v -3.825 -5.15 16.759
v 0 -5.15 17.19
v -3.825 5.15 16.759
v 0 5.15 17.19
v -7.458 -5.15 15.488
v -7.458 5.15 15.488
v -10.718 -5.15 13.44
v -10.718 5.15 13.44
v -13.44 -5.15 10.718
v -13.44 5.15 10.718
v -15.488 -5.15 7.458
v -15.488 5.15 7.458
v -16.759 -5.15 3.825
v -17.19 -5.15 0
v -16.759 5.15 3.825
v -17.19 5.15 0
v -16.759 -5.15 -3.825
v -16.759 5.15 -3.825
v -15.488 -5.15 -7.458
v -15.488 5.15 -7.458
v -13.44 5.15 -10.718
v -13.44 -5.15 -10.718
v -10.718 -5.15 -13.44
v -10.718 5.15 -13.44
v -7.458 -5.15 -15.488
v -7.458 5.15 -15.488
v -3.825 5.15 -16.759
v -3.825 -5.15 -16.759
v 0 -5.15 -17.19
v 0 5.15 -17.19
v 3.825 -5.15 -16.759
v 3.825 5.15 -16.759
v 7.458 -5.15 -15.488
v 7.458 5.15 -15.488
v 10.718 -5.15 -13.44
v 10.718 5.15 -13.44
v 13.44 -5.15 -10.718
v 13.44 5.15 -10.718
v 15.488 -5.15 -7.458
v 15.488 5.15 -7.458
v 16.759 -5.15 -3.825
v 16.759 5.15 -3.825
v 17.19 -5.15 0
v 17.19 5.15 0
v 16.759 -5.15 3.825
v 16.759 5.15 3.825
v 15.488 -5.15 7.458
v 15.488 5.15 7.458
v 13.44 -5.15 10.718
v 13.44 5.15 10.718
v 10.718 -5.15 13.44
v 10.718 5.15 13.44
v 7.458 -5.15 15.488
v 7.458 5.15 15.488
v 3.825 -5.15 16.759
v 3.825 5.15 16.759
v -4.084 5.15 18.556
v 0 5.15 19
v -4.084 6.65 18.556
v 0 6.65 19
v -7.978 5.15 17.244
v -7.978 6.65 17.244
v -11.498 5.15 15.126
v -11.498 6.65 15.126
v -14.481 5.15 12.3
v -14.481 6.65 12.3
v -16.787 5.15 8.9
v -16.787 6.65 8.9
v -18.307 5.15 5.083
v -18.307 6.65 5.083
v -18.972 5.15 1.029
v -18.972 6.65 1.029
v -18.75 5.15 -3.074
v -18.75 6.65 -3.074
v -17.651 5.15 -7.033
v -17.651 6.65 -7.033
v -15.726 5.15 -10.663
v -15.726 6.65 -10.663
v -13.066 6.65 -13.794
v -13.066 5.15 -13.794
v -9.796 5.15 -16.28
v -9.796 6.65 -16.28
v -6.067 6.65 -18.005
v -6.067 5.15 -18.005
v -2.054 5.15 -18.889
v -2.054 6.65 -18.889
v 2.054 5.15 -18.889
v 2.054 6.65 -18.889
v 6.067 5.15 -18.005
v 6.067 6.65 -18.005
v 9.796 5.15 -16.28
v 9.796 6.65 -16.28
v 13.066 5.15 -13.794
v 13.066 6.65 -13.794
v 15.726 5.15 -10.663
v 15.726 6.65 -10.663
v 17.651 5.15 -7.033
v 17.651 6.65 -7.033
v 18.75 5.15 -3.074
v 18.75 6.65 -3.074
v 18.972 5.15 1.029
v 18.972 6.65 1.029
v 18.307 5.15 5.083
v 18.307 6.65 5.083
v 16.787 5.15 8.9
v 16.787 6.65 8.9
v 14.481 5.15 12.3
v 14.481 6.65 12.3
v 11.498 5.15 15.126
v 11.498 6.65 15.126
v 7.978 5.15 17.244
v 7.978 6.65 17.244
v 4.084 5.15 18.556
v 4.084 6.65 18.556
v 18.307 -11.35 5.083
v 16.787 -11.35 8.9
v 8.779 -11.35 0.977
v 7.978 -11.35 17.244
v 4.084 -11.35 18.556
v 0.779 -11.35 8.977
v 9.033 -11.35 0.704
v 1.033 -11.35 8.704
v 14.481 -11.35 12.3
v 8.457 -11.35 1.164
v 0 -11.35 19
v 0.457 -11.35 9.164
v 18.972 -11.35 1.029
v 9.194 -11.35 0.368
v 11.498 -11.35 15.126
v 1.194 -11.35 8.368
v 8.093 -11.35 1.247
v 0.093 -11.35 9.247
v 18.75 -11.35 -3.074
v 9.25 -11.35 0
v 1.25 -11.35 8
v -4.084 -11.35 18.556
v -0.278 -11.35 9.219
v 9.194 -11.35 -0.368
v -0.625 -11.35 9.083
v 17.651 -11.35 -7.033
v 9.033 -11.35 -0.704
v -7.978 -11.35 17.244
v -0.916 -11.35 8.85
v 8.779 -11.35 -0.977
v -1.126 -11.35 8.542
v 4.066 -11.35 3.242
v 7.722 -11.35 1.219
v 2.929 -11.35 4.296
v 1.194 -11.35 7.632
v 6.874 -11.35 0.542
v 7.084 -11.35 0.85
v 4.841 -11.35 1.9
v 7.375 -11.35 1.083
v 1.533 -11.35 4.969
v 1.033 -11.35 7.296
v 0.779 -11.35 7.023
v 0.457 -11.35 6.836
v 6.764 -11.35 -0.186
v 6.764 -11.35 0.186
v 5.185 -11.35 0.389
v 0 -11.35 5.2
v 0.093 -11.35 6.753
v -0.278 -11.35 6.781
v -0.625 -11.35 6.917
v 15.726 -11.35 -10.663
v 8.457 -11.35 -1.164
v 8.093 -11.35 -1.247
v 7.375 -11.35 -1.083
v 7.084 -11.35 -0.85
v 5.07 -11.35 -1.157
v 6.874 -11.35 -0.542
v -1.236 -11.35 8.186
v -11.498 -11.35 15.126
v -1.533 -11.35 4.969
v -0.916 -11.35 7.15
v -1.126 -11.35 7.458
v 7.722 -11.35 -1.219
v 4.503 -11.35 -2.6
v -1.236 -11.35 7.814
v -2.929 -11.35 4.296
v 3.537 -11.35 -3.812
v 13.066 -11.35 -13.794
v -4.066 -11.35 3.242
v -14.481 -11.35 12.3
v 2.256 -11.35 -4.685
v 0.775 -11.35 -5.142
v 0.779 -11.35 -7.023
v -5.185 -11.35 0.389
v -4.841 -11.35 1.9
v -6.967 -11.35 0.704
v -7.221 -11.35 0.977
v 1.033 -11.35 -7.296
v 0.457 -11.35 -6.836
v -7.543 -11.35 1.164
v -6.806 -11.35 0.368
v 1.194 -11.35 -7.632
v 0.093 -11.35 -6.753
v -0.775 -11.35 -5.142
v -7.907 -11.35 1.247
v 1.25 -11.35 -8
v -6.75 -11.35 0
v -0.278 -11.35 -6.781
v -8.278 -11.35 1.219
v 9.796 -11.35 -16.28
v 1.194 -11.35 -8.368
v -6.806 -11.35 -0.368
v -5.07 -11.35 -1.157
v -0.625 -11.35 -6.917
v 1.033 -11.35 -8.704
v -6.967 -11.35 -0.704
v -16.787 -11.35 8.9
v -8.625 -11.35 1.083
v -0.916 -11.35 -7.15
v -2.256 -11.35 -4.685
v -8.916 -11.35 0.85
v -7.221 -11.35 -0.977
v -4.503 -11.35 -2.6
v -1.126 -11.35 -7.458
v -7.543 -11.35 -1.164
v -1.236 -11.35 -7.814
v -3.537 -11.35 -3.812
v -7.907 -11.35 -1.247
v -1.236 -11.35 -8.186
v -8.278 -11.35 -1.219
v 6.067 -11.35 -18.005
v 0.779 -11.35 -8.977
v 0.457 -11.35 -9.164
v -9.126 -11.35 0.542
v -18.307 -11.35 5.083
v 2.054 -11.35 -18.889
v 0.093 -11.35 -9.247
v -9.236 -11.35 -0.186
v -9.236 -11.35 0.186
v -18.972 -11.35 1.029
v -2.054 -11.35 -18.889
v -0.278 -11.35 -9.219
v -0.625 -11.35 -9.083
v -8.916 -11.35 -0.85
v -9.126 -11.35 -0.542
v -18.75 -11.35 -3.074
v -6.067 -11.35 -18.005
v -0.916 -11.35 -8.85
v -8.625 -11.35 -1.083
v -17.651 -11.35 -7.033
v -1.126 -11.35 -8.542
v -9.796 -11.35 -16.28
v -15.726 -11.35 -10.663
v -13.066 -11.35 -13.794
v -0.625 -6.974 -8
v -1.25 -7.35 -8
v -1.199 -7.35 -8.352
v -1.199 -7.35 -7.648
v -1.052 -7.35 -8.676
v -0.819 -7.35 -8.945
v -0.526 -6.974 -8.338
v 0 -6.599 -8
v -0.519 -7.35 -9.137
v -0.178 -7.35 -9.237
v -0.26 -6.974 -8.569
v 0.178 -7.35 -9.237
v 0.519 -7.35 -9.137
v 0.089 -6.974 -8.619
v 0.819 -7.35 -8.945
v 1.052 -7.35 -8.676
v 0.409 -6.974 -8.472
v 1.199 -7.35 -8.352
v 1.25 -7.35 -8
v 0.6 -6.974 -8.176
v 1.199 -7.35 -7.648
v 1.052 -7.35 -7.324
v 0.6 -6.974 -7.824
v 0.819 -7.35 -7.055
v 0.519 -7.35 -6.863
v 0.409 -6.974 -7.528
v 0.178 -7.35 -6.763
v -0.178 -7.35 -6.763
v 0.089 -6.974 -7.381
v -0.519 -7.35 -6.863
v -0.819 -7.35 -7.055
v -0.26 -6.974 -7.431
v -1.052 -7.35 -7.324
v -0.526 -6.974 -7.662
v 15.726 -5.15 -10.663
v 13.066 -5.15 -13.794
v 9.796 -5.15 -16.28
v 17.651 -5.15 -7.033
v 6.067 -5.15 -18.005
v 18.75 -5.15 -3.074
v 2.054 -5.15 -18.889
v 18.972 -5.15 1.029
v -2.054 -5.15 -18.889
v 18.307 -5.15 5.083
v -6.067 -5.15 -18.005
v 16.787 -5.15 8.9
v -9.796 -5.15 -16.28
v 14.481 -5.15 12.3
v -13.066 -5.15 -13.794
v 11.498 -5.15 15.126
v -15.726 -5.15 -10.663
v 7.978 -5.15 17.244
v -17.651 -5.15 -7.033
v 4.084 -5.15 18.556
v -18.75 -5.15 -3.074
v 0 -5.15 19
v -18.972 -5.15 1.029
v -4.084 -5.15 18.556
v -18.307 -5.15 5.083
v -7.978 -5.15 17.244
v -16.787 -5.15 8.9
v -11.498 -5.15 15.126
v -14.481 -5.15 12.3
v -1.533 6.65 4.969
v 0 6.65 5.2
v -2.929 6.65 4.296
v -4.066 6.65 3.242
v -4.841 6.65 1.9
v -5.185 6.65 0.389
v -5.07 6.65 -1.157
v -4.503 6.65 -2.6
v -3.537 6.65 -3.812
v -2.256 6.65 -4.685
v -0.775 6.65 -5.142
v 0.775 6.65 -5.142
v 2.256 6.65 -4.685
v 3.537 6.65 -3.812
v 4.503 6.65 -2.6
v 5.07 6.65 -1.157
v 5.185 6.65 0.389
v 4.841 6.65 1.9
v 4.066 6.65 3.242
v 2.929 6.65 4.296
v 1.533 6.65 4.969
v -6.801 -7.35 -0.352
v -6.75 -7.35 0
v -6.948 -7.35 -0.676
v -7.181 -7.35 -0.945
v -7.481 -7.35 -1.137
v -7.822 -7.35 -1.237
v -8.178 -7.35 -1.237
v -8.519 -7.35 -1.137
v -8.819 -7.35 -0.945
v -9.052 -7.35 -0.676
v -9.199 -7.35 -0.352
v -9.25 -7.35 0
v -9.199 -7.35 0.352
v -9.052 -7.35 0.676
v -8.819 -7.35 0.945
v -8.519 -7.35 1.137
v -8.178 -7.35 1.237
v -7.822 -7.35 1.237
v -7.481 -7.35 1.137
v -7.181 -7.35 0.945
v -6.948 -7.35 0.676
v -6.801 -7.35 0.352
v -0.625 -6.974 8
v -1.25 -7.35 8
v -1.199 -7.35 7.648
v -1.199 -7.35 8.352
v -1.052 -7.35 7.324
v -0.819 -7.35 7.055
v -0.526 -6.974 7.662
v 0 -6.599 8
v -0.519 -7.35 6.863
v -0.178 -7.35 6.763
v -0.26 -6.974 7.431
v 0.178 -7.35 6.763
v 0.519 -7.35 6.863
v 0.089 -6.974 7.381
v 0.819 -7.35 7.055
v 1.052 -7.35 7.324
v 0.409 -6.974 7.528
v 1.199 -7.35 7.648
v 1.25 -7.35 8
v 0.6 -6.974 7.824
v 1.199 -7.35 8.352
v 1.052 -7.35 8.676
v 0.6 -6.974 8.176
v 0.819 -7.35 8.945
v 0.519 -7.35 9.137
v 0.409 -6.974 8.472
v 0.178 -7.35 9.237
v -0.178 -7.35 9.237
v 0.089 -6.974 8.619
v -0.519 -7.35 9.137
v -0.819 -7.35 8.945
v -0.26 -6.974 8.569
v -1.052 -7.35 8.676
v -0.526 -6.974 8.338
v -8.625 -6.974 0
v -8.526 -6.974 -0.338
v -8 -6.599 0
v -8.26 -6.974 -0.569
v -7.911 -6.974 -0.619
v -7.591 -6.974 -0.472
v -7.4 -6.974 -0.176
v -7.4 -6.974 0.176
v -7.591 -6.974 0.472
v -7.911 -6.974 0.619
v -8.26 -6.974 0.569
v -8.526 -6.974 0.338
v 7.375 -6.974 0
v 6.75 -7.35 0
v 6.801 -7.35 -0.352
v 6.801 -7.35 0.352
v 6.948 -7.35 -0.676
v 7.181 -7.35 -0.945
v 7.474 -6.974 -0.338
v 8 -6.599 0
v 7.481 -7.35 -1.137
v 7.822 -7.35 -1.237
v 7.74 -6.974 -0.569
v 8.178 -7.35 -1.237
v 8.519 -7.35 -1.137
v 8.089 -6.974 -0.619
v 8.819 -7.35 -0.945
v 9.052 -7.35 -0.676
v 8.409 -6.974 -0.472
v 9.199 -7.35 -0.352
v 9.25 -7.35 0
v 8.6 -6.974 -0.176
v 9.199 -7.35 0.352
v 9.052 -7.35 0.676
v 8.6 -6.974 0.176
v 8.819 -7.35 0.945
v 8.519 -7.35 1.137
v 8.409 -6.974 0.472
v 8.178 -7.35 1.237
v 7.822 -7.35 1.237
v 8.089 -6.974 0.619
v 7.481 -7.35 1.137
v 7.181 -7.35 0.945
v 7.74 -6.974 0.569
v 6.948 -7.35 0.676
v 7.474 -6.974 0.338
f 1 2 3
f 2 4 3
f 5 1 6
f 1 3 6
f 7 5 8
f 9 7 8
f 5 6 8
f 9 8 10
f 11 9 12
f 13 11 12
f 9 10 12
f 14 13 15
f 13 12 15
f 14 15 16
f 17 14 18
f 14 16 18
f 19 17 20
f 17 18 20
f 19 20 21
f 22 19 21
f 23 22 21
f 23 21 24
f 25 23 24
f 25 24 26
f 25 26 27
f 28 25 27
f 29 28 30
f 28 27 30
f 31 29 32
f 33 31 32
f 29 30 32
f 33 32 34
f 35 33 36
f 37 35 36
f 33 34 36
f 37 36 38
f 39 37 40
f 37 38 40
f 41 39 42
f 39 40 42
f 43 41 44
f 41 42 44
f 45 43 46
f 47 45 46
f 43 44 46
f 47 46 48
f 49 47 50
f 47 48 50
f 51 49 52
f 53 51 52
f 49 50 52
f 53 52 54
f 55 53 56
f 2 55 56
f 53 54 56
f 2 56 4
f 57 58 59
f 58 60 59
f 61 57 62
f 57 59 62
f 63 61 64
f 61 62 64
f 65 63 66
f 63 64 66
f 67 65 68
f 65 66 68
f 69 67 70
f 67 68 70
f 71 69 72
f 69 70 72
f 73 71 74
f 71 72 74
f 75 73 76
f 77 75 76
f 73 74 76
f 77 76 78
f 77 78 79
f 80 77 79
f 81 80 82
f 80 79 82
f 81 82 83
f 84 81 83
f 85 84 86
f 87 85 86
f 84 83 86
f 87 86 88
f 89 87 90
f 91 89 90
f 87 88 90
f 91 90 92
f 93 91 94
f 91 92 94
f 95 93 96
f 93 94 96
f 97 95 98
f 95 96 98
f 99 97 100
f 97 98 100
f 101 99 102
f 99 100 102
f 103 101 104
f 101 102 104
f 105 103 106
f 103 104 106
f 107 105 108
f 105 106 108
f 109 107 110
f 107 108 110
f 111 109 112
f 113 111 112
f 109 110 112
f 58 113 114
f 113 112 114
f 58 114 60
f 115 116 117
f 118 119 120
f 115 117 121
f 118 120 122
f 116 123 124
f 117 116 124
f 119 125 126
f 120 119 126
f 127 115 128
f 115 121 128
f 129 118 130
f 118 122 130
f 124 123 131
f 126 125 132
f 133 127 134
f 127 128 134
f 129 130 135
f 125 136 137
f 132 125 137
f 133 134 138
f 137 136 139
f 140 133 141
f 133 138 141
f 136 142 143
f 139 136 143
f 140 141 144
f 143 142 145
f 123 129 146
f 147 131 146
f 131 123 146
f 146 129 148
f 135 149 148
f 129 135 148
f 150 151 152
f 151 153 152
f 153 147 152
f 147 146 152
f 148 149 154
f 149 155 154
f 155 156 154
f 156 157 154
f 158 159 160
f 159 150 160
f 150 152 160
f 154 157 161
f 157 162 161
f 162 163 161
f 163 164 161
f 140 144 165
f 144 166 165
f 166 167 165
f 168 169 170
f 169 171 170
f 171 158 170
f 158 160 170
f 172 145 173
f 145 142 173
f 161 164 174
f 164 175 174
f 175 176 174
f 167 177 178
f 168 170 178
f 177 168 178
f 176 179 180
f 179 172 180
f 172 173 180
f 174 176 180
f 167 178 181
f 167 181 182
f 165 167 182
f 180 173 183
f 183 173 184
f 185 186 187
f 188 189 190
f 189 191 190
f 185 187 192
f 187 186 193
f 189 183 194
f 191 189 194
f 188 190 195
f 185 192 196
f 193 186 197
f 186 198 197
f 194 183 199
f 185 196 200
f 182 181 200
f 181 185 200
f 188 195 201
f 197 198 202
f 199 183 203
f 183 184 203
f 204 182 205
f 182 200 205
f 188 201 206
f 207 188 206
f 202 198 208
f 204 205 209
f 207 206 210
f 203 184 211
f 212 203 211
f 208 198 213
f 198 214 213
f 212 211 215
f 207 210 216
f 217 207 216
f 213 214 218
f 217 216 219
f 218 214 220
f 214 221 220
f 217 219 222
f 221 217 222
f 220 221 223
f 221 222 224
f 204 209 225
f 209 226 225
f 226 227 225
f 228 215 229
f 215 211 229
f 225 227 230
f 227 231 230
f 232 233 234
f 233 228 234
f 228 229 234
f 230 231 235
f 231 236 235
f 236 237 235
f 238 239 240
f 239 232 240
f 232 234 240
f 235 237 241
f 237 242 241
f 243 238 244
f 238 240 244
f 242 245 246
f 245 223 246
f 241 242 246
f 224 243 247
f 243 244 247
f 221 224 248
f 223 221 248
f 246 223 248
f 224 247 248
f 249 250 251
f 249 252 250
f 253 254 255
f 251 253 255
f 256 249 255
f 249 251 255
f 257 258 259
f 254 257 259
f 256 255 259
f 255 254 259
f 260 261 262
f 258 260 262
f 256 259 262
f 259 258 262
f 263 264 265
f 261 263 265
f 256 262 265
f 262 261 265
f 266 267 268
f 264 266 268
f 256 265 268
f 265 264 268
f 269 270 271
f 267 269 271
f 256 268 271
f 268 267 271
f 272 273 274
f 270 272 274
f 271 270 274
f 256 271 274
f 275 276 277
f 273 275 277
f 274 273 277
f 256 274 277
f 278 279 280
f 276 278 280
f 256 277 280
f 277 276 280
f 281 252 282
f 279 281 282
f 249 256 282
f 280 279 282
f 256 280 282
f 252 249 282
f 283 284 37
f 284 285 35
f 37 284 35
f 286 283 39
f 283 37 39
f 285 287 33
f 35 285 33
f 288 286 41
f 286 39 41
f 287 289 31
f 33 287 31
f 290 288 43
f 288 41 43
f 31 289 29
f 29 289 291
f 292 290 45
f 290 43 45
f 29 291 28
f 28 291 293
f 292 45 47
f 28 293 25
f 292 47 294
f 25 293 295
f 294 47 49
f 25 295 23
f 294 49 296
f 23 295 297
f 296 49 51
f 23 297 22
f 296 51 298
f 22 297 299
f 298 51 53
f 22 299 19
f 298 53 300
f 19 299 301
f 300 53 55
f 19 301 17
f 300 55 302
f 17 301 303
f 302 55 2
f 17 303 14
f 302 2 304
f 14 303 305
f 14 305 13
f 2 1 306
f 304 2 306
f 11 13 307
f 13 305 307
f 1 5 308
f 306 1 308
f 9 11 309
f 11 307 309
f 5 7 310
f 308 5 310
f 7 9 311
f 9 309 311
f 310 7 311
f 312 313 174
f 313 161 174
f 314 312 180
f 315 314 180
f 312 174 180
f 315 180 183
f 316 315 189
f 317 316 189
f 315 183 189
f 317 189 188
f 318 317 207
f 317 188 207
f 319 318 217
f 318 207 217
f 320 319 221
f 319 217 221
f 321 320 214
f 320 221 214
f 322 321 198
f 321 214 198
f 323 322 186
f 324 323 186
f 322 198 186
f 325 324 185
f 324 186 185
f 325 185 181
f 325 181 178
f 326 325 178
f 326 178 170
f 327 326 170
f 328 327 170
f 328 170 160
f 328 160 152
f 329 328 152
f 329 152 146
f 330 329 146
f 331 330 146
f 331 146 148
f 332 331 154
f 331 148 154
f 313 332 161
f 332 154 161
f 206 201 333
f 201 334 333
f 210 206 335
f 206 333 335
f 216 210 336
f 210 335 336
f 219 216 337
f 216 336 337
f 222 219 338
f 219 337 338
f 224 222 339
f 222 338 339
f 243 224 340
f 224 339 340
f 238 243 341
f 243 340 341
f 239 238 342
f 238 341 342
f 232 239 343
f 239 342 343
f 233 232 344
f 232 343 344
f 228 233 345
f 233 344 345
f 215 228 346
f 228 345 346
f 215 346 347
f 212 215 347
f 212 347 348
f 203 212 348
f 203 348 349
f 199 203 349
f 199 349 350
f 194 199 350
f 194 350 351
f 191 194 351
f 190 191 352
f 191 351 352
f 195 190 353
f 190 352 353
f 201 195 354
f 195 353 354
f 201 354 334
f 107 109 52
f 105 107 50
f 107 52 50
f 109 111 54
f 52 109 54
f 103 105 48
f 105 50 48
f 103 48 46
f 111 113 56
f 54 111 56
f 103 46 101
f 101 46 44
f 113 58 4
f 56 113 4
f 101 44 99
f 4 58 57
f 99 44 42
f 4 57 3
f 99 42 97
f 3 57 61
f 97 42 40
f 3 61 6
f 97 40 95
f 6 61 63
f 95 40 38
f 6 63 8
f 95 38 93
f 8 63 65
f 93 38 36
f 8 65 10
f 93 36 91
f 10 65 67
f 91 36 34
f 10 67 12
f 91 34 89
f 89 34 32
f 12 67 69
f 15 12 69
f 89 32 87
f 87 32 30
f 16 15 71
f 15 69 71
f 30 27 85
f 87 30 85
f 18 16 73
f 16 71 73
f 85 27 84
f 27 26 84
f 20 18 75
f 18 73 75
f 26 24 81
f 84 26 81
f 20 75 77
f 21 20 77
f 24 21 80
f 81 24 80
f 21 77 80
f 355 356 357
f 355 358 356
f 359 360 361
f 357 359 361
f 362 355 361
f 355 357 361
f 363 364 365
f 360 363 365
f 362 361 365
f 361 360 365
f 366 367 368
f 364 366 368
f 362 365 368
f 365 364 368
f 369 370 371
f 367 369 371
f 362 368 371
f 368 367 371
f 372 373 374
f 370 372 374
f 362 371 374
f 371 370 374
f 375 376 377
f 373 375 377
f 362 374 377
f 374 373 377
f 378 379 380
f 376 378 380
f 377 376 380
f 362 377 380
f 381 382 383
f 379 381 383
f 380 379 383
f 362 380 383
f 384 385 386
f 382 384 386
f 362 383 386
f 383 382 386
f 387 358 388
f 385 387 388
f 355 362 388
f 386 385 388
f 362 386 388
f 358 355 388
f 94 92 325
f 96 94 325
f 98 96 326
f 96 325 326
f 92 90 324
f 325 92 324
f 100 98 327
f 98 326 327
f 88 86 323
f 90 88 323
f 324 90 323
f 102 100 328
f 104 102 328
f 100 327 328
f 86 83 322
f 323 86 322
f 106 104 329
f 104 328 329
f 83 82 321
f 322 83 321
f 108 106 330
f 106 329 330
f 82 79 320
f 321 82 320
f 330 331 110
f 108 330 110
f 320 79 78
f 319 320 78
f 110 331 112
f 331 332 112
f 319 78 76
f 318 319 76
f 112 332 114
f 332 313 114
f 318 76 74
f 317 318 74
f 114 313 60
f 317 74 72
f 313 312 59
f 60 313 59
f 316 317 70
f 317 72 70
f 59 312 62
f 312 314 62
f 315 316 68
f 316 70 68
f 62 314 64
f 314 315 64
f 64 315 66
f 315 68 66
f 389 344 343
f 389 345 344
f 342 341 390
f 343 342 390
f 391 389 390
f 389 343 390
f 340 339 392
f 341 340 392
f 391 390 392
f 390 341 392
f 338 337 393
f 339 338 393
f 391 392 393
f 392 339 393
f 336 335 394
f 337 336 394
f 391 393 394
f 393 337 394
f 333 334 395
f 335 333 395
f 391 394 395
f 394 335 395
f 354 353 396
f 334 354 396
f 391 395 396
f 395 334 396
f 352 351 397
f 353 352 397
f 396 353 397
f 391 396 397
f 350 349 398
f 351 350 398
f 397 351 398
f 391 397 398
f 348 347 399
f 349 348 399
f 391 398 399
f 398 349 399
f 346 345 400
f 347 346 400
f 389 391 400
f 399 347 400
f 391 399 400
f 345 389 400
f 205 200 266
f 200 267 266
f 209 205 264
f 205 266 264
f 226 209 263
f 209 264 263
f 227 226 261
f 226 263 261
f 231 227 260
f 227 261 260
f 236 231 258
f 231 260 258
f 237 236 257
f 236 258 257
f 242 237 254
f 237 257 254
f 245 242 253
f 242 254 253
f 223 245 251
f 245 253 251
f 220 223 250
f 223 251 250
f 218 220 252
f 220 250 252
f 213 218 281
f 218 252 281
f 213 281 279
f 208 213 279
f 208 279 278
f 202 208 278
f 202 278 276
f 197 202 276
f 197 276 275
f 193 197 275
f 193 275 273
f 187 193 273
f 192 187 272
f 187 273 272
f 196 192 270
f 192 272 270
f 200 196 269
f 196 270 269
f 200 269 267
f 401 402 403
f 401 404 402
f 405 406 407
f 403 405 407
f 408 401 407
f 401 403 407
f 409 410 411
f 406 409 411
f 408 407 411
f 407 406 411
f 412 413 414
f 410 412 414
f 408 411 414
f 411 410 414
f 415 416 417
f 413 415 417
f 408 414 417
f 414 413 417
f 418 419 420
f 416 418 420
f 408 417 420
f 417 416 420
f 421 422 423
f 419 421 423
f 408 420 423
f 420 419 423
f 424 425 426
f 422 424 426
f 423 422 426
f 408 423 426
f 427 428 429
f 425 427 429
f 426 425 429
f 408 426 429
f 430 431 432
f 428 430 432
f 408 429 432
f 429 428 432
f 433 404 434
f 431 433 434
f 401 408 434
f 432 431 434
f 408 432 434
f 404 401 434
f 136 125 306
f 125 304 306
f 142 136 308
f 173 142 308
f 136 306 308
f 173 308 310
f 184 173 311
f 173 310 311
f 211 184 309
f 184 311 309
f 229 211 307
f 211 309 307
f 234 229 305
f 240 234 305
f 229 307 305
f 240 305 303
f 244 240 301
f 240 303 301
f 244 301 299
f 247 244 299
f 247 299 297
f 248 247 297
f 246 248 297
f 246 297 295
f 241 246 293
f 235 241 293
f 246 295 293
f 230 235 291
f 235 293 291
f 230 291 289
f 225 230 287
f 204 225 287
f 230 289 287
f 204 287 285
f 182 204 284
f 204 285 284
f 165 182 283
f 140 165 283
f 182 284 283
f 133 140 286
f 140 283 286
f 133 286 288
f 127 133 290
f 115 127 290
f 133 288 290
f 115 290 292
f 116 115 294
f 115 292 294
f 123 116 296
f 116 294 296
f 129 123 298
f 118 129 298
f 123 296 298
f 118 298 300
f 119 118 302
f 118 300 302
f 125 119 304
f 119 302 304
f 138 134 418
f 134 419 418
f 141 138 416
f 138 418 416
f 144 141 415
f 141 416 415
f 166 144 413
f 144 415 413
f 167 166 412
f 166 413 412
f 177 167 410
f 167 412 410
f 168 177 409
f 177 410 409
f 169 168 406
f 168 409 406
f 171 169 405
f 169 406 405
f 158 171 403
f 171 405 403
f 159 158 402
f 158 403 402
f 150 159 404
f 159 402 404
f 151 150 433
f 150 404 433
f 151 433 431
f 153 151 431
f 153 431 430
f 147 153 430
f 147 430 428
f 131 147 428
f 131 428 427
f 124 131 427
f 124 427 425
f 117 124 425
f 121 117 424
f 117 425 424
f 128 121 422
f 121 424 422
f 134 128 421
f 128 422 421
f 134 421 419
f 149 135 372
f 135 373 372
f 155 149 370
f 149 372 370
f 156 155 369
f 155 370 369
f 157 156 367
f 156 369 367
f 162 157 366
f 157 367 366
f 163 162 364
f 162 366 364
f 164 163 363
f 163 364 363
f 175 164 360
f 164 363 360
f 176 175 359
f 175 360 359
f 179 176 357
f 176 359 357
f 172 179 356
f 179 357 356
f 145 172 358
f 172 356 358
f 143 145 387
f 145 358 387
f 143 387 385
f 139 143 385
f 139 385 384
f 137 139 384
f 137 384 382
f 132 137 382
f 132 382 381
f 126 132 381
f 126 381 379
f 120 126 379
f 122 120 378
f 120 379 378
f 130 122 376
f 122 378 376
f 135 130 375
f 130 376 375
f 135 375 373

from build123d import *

# Parameters (mm, degrees)
M3_TAPPED_HOLE1_D     = 2.5
M3_TAPPED_HOLE1_DEPTH = 4
M3_TAPPED_HOLE1_TIP   = 0.751075774


with BuildPart() as part:
    # Sketch1 → Revolve1 (revolve)
    with BuildSketch(Plane(origin=(0, 0, 0), x_dir=(0, 0, -1), z_dir=(1, 0, 0)), mode=Mode.PRIVATE) as revolve1_sk:
        Polygon((17.19, -5.15), (17.19, 5.15), (19, 5.15), (19, 6.65), (10.28, 6.65), (5.2, 6.65), (5.2, -6.65), (5.2, -11.35), (19, -11.35), (19, -5.15), align=None)
    revolve(revolve1_sk.sketch.rotate(Axis((0, 10.31552251, 0), (0, -1, 0)), 180), axis=Axis((0, 10.31552251, 0), (0, -1, 0)))

    # M3 Tapped Hole1
    with Locations(Plane(origin=(0, -11.35, 0), x_dir=(-1, 0, 0), z_dir=(0, -1, 0))):
        with Locations((0, -8), (-8, 0), (0, 8), (8, 0)):
            Hole(M3_TAPPED_HOLE1_D / 2, depth=M3_TAPPED_HOLE1_DEPTH)
            with Locations((0, 0, -(M3_TAPPED_HOLE1_DEPTH + M3_TAPPED_HOLE1_TIP / 2))):  # 118° drill point
                Cone(0, M3_TAPPED_HOLE1_D / 2, M3_TAPPED_HOLE1_TIP, mode=Mode.SUBTRACT)


solid = part.part
